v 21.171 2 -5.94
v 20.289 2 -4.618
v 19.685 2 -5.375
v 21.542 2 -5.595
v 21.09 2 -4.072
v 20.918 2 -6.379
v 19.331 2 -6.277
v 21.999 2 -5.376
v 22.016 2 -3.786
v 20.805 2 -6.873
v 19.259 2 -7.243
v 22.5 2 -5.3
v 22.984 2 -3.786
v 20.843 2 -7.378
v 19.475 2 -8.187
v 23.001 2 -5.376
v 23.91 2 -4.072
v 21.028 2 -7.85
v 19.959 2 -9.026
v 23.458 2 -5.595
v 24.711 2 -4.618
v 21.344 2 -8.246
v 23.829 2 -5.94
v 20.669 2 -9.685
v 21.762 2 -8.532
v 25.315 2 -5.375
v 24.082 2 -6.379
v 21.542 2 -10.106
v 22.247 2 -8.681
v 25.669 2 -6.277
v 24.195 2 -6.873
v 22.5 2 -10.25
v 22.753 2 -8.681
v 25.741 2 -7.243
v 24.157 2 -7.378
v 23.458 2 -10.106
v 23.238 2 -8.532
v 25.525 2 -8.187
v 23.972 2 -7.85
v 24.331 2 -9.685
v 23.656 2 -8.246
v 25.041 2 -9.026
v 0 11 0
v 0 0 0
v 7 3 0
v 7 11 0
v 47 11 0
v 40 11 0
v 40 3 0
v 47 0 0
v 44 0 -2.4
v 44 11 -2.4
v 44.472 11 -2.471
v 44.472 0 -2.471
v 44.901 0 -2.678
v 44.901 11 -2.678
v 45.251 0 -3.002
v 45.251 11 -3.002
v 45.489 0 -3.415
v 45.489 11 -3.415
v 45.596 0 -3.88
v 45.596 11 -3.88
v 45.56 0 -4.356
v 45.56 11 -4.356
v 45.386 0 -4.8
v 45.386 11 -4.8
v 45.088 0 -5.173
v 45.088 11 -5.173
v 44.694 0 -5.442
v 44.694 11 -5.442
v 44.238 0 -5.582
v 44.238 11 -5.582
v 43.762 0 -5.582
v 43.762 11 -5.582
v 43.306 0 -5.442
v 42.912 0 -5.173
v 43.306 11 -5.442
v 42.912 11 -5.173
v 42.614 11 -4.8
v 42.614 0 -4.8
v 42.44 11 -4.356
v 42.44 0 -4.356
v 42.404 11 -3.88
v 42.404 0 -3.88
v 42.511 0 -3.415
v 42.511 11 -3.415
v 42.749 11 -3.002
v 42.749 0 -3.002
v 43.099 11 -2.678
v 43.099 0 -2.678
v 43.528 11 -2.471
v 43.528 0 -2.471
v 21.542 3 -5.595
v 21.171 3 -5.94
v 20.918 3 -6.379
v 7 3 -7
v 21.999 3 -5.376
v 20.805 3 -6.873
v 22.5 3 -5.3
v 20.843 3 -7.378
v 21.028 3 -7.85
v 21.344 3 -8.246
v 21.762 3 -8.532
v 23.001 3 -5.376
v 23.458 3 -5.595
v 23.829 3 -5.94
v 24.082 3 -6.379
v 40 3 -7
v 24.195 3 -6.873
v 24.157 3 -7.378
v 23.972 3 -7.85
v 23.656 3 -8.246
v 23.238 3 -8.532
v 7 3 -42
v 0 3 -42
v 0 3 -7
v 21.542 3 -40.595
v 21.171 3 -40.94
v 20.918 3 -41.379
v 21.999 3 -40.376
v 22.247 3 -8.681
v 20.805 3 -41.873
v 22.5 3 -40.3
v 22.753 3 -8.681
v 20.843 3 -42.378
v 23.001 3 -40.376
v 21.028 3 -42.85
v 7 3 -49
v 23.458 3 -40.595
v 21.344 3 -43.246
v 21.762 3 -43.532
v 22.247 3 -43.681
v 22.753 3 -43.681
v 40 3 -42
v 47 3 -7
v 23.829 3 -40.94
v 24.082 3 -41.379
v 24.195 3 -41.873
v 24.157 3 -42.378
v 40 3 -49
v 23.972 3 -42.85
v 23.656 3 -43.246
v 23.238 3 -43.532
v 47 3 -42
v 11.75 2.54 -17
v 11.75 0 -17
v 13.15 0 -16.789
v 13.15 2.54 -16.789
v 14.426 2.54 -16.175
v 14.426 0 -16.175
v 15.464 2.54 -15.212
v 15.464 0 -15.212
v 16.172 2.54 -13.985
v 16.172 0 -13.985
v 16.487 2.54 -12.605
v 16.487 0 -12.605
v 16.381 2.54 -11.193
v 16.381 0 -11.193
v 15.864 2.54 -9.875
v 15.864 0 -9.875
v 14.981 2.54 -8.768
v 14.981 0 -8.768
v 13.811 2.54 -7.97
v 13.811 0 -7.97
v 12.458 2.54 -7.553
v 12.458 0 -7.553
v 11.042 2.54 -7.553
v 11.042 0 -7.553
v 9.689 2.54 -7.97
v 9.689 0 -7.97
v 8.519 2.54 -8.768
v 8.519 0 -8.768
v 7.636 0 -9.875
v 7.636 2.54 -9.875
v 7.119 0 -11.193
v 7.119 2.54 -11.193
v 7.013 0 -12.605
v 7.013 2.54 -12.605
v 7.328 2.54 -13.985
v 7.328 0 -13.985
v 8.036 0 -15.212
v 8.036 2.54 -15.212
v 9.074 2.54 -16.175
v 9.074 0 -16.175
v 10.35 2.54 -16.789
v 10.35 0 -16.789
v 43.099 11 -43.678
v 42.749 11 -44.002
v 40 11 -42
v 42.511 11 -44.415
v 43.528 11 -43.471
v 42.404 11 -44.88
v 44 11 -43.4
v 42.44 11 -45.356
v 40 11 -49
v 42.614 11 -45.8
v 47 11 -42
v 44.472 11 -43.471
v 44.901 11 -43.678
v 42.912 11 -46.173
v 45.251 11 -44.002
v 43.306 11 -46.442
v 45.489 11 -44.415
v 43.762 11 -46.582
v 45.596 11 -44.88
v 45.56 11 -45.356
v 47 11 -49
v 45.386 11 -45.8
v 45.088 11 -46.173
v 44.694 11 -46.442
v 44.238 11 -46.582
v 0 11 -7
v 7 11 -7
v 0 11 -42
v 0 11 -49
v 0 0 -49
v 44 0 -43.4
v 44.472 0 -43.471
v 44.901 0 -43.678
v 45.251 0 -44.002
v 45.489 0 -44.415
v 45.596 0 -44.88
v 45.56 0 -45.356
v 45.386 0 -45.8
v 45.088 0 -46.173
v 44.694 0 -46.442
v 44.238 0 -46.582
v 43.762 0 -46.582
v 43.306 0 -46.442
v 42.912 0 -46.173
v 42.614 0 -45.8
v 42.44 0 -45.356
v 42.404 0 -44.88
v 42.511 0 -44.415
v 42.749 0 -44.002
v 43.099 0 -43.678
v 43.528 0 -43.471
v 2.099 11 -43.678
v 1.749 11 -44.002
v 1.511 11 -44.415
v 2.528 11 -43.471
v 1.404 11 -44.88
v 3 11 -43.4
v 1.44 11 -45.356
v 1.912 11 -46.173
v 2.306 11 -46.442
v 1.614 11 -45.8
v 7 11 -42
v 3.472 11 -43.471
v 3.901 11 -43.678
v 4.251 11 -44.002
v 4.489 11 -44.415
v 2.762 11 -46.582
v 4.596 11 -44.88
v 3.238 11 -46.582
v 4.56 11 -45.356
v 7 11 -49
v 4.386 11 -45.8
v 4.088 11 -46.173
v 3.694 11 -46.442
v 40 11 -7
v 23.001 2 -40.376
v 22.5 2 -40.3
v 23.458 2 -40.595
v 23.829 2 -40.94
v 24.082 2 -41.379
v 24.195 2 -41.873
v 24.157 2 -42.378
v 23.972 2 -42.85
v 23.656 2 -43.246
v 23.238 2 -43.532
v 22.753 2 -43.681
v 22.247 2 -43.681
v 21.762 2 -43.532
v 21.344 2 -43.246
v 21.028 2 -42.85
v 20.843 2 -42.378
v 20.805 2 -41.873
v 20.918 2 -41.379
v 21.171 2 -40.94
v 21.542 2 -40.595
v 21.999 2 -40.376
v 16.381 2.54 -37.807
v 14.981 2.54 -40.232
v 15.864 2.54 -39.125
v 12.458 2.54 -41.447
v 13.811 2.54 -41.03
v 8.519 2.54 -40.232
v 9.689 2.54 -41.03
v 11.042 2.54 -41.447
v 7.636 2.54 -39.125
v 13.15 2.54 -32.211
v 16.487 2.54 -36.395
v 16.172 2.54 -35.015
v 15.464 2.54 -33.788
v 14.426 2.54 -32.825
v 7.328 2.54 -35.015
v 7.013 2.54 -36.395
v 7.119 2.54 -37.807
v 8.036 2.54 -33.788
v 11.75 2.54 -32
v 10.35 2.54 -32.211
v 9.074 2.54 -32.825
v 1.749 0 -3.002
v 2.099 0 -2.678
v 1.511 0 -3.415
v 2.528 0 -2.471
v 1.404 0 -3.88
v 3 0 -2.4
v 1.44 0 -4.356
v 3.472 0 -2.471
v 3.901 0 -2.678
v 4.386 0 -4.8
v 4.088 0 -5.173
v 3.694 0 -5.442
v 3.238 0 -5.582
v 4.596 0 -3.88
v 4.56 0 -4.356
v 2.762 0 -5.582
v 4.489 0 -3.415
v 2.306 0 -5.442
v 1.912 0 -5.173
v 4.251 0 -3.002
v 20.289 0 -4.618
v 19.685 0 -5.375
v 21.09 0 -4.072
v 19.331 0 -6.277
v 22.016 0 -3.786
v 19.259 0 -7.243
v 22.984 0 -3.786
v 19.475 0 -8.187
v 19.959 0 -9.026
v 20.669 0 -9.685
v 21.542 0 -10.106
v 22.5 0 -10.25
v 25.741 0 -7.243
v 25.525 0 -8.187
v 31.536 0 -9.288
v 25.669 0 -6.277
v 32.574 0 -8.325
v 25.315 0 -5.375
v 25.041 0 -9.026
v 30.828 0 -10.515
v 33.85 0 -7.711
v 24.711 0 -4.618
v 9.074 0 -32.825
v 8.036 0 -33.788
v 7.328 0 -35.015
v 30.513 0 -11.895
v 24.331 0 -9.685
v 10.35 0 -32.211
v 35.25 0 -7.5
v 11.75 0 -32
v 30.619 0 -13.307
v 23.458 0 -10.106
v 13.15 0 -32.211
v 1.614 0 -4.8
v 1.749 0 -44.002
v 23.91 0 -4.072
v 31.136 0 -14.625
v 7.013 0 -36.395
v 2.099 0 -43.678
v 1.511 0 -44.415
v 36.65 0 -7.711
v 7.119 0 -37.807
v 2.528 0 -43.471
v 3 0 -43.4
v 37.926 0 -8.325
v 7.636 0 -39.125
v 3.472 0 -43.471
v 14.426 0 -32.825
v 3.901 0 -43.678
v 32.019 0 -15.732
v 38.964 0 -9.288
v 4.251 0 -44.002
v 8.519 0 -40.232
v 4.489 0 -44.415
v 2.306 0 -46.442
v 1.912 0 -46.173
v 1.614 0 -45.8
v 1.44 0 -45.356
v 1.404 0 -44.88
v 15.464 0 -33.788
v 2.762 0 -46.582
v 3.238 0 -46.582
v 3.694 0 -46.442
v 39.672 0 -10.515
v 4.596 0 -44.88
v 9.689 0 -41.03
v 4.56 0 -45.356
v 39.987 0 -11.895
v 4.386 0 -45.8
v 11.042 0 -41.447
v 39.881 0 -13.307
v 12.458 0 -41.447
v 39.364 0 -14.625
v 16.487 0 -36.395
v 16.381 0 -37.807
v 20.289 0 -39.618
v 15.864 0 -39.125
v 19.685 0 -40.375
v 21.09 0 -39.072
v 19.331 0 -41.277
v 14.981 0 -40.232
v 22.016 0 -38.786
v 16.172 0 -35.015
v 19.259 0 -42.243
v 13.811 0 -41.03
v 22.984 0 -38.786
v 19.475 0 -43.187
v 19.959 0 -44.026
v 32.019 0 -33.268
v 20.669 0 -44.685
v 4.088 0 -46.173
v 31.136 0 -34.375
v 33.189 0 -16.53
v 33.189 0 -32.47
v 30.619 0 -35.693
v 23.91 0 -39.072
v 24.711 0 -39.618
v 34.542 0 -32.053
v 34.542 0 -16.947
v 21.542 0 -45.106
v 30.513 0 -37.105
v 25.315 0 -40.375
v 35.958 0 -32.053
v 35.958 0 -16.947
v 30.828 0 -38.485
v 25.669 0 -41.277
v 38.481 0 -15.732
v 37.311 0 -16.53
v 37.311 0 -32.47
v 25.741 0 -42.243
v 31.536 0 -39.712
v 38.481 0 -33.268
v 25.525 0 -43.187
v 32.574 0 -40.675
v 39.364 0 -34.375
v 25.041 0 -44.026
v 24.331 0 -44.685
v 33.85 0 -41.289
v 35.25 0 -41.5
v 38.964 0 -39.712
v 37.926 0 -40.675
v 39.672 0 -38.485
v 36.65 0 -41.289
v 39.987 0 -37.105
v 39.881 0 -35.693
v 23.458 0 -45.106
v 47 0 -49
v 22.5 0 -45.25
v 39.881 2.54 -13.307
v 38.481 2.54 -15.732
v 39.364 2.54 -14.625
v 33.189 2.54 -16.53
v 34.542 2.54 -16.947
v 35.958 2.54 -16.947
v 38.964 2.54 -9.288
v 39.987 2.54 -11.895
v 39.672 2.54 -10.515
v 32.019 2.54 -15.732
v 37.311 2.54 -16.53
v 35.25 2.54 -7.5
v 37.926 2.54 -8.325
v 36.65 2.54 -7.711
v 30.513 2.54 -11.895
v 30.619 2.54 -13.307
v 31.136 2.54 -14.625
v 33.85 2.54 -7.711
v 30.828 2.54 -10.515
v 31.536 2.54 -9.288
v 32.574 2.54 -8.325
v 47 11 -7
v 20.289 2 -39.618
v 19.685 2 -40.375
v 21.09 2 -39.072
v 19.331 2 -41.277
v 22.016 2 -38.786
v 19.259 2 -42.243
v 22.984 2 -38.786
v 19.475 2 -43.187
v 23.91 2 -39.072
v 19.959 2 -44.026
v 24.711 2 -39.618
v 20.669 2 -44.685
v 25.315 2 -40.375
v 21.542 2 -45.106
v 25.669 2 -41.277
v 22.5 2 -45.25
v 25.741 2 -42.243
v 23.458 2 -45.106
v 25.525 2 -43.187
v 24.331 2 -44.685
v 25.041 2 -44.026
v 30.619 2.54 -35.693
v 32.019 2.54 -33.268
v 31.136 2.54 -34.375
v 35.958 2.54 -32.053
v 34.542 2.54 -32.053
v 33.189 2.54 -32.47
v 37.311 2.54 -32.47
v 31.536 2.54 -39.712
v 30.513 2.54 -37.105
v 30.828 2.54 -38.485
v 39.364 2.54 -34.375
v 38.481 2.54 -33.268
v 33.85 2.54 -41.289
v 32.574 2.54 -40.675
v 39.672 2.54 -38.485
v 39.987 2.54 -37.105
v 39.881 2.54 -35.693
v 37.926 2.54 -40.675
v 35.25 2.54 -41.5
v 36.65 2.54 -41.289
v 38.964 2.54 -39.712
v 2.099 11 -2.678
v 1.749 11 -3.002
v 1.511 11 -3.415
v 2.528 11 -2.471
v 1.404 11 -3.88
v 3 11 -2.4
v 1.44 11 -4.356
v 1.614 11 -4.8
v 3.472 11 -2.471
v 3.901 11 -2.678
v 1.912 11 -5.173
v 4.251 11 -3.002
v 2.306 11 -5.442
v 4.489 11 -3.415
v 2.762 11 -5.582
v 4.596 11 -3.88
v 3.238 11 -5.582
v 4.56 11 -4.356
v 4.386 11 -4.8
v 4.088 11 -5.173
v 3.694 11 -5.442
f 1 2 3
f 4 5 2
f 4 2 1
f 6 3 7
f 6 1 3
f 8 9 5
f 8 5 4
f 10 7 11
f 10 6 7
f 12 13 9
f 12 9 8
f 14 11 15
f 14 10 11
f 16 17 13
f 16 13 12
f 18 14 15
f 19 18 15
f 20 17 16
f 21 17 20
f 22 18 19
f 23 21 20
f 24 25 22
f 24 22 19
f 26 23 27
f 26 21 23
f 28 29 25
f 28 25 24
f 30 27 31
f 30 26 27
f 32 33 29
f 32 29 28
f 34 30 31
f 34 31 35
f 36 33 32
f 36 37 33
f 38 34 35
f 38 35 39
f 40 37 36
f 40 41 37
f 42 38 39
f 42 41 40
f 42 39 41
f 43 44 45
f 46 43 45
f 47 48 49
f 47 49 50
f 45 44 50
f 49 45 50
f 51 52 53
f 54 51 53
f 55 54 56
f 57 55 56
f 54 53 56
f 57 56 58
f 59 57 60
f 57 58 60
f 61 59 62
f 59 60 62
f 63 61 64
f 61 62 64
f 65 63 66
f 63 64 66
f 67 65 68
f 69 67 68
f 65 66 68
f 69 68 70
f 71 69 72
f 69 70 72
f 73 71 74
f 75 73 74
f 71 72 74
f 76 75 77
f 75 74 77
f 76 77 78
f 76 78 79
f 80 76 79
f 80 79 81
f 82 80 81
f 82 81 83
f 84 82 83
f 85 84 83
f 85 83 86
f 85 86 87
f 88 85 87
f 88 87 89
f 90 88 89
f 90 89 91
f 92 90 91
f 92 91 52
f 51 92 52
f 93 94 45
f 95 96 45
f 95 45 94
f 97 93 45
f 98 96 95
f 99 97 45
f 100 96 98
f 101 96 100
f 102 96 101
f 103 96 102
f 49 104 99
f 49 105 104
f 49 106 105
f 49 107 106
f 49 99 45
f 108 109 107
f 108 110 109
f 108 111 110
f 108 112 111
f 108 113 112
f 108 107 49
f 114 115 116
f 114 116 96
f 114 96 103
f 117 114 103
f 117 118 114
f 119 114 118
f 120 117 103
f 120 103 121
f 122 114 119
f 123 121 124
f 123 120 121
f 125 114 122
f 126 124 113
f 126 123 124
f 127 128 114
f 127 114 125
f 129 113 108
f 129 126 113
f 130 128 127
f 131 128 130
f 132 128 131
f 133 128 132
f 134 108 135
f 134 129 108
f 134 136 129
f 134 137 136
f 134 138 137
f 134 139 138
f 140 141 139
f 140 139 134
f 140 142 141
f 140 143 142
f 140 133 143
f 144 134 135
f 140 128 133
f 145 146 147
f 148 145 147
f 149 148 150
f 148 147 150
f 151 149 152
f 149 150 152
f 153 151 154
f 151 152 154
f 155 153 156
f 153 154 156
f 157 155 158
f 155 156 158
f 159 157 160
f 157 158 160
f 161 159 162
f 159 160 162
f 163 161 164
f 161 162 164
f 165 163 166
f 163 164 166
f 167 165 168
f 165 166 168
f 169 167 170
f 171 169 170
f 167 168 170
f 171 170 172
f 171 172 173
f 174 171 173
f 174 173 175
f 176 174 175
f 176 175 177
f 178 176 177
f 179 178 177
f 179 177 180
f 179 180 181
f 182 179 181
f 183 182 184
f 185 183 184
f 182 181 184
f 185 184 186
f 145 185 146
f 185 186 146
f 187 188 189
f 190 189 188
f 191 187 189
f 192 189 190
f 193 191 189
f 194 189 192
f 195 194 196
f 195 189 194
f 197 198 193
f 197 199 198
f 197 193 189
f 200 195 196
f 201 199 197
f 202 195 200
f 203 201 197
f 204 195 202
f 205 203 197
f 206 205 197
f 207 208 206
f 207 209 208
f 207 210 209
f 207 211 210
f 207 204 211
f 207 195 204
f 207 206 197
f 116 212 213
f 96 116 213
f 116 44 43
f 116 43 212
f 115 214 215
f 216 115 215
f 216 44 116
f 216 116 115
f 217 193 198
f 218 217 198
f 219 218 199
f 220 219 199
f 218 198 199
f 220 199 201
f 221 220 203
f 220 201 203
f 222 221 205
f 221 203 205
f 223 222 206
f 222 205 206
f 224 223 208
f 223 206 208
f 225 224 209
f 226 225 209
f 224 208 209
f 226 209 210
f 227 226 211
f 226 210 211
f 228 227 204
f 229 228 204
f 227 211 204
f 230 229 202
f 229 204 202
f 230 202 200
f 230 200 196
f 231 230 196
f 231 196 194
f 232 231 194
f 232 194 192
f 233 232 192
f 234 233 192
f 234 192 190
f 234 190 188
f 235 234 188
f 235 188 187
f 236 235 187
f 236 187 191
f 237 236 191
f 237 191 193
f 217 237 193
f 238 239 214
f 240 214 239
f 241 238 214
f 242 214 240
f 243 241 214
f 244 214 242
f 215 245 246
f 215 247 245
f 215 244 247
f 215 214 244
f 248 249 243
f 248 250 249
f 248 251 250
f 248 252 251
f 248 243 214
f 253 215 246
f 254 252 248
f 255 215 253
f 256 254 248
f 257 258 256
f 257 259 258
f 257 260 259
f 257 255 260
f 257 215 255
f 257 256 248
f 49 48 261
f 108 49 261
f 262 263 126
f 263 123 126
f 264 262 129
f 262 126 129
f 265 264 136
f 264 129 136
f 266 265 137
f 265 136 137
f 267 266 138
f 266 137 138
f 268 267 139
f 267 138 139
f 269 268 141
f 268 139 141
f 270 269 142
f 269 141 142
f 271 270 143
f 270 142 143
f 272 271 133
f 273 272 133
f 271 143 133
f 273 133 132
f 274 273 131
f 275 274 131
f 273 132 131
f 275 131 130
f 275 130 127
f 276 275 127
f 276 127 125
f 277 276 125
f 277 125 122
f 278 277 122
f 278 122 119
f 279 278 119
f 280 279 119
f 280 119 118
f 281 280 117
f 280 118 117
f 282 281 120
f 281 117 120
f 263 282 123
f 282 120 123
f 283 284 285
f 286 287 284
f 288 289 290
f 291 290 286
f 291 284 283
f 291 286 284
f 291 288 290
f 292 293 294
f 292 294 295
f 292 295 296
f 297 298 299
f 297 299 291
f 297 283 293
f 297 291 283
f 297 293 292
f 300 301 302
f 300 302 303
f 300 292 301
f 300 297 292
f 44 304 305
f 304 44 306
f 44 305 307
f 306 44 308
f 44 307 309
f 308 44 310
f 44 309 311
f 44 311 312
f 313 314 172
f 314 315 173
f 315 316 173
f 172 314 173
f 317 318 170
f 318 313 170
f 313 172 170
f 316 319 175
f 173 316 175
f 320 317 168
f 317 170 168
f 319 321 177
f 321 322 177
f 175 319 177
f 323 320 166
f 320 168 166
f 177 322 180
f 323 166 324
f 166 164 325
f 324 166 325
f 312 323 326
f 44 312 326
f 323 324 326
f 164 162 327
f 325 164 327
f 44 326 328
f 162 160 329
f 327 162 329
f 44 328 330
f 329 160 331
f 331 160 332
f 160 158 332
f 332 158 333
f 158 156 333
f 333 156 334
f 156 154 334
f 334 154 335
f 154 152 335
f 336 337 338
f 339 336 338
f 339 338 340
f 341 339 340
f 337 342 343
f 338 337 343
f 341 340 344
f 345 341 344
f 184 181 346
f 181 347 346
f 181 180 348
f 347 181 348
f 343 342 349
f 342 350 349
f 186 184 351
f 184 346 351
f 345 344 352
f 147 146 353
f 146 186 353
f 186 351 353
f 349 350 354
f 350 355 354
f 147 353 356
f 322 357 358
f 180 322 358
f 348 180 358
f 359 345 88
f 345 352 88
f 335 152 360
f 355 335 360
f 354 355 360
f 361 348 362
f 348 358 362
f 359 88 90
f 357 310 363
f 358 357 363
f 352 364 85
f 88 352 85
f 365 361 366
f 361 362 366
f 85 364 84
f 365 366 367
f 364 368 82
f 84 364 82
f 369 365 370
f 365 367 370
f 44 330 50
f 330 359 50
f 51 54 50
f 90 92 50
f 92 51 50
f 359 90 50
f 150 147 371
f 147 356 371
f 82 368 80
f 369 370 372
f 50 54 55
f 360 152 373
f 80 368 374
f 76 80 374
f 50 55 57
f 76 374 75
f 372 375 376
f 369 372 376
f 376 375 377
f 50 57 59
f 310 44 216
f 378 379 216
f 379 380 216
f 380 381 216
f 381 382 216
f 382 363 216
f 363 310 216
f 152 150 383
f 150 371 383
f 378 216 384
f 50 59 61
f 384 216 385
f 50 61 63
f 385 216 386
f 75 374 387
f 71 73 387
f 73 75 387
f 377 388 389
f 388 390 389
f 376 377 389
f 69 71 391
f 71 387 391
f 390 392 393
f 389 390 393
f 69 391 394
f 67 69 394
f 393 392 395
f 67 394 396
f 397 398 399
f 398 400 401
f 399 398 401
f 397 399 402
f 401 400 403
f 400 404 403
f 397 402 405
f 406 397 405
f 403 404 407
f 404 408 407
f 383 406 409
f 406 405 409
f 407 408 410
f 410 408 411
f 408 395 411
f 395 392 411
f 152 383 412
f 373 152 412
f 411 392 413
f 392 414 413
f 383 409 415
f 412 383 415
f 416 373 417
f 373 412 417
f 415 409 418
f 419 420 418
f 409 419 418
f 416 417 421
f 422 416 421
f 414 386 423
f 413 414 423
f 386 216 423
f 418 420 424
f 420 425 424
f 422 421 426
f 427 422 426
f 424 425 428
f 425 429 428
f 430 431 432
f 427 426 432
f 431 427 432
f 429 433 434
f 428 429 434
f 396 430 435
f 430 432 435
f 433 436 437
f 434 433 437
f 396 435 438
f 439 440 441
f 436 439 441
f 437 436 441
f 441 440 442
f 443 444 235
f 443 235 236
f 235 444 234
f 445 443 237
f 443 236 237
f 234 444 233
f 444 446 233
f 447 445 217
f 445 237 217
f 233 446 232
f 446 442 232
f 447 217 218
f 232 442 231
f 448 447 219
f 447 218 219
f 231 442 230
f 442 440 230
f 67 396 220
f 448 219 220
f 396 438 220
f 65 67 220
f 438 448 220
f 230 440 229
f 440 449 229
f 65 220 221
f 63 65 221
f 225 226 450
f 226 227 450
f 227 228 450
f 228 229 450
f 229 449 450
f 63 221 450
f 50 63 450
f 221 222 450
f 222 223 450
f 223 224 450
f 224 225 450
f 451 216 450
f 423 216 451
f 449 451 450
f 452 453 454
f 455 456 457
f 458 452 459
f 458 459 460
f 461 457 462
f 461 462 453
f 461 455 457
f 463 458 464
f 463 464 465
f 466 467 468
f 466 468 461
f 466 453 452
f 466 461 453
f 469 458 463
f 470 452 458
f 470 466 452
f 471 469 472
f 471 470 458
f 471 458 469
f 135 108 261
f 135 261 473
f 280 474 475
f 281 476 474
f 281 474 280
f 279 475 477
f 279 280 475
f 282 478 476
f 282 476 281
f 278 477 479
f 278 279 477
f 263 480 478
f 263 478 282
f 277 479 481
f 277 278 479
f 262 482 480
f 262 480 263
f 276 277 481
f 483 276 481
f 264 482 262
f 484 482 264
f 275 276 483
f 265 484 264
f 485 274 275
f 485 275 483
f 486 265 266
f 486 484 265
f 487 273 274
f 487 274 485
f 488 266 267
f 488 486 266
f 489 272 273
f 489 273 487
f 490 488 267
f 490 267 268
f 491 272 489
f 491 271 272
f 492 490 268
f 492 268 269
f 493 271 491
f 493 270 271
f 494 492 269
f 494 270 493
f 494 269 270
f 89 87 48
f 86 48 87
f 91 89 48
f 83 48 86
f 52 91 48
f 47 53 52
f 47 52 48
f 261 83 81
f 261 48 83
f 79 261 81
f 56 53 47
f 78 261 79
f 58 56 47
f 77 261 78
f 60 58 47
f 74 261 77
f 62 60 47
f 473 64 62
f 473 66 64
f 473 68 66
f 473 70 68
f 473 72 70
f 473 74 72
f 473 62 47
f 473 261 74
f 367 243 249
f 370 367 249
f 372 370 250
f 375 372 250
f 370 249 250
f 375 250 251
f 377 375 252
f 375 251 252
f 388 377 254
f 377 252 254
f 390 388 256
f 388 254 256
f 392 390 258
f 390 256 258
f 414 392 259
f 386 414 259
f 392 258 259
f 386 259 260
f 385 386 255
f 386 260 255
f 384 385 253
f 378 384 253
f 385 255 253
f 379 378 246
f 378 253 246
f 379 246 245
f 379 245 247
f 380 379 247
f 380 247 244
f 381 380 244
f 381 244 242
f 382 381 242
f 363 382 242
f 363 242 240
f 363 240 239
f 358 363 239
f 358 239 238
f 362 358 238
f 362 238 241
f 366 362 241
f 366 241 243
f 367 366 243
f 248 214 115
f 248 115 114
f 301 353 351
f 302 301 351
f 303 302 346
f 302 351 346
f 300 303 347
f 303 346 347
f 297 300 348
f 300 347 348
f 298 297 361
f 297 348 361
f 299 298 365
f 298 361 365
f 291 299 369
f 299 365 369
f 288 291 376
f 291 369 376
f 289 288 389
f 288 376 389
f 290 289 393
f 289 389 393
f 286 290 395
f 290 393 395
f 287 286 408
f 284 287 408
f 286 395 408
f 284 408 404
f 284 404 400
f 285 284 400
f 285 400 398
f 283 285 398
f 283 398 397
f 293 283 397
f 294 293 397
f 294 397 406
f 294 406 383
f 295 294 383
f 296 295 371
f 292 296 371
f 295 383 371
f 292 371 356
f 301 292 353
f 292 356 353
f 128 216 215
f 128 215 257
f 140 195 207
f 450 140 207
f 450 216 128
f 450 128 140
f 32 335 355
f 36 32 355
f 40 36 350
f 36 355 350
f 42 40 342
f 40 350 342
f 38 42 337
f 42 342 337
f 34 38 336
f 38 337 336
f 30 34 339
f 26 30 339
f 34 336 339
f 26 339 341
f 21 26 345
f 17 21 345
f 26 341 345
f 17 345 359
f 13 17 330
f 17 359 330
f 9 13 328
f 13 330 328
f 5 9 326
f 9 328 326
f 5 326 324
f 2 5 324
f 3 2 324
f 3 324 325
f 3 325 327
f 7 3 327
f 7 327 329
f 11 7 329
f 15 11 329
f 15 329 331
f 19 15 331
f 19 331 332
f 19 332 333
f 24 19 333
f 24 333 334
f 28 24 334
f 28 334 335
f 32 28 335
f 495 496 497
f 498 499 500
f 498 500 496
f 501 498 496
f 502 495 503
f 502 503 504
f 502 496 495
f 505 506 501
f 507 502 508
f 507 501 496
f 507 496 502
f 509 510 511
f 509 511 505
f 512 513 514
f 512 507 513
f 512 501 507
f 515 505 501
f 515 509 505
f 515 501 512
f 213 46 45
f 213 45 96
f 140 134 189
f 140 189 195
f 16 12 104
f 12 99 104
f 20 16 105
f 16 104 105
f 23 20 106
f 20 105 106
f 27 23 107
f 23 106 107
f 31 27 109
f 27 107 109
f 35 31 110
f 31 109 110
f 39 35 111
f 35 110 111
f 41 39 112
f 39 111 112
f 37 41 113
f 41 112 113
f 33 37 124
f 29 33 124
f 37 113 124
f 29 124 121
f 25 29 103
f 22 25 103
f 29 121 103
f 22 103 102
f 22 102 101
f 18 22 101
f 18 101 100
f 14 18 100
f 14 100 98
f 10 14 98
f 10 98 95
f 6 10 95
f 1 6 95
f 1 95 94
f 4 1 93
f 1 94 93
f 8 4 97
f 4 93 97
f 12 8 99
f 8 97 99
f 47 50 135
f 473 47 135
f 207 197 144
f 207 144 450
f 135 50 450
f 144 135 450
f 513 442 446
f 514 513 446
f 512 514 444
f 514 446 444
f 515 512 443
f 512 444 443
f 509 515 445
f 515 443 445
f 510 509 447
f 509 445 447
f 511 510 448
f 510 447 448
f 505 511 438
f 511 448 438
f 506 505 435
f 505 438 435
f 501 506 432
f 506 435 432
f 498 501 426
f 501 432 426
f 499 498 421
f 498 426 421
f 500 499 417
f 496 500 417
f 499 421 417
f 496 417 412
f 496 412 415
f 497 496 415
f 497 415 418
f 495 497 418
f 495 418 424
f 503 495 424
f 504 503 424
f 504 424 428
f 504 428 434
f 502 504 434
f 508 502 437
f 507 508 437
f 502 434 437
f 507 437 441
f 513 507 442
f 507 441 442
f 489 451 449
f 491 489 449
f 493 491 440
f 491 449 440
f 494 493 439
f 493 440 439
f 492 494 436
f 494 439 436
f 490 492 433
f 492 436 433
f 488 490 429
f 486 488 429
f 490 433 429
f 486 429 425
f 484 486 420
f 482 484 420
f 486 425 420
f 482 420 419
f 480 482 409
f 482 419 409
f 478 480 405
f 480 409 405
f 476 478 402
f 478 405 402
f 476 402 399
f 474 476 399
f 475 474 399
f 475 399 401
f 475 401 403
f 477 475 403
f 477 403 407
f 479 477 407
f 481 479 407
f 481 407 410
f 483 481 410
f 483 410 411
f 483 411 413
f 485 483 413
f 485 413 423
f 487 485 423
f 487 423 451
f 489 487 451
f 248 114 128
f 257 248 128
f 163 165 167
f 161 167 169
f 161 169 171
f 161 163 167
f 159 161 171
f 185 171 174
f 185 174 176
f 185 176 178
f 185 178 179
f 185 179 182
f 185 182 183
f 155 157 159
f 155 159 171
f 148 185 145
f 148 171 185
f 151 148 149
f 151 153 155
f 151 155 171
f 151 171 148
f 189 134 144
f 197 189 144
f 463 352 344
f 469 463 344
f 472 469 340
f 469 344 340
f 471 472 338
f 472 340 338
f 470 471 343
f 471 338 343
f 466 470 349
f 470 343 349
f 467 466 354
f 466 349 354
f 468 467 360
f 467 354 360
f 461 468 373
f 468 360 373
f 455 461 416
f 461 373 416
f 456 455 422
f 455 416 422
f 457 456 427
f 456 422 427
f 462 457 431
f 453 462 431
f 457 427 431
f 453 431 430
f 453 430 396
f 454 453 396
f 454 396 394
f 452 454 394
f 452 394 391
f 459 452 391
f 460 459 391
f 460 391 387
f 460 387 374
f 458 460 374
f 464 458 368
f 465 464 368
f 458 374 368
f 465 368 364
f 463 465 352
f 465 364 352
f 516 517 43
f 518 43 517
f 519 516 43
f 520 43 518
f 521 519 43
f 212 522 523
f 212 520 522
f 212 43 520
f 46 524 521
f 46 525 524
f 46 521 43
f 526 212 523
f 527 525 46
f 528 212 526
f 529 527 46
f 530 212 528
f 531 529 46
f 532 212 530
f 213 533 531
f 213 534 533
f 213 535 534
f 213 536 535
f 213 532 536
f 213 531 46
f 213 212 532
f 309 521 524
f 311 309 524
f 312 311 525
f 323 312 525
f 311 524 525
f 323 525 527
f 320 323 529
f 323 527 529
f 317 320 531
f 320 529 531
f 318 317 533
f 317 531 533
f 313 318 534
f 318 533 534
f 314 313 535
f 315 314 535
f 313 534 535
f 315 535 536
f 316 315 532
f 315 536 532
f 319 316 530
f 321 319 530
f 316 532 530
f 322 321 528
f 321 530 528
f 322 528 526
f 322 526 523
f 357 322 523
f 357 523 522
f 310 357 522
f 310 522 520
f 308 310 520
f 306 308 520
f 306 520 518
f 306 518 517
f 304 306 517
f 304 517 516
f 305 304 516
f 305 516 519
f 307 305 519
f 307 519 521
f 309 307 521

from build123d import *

# Parameters (mm, degrees)
CROQUIS1_W                                           = 47
CROQUIS1_H                                           = 49
SALIENTE_EXTRUIR1_DEPTH                              = 3
CROQUIS14_W                                          = 7
CROQUIS14_H                                          = 7
SALIENTE_EXTRUIR4_DEPTH                              = 8
TALADRO_DE_MARGEN_PARA_M35_D                         = 3.2
REFRENTADO_PARA_TORNILLO_CON_CABEZA_PLAN_D           = 3.4
REFRENTADO_PARA_TORNILLO_CON_CABEZA_PLAN_CBORE_D     = 6.5
REFRENTADO_PARA_TORNILLO_CON_CABEZA_PLAN_CBORE_DEPTH = 2
CROQUIS25_R                                          = 4.75
CORTAR_EXTRUIR4_DEPTH                                = 2.54


with BuildPart() as part:
    # Croquis1 → Saliente-Extruir1 (new body)
    with BuildSketch(Plane(origin=(0, 0, 0), x_dir=(1, 0, 0), z_dir=(0, 1, 0))):
        with Locations((23.5, 24.5)):
            Rectangle(CROQUIS1_W, CROQUIS1_H)
    extrude(amount=SALIENTE_EXTRUIR1_DEPTH)

    # Croquis14 → Saliente-Extruir4 (add)
    with BuildSketch(Plane(origin=(0, 3, 0), x_dir=(1, 0, 0), z_dir=(0, 1, 0))):
        with Locations((3.5, 45.5)):
            Rectangle(CROQUIS14_W, CROQUIS14_H)
        with Locations((43.5, 45.5)):
            Rectangle(CROQUIS14_W, CROQUIS14_H)
        with Locations((43.5, 3.5)):
            Rectangle(CROQUIS14_W, CROQUIS14_H)
        with Locations((3.5, 3.5)):
            Rectangle(CROQUIS14_W, CROQUIS14_H)
    extrude(amount=SALIENTE_EXTRUIR4_DEPTH)

    # Taladro de margen para M35 (through all)
    with Locations(Plane(origin=(3, 0, -4), x_dir=(0, 0, -1), z_dir=(0, -1, 0))):
        with Locations((0, 0), (0, 41), (41, 41), (41, 0)):
            Hole(TALADRO_DE_MARGEN_PARA_M35_D / 2)

    # Refrentado para tornillo con cabeza plana de M31 (through all)
    with Locations(Plane(origin=(22.5, 0, -7), x_dir=(0, 0, -1), z_dir=(0, -1, 0))):
        with Locations((0, 0), (35, 0)):
            CounterBoreHole(REFRENTADO_PARA_TORNILLO_CON_CABEZA_PLAN_D / 2, REFRENTADO_PARA_TORNILLO_CON_CABEZA_PLAN_CBORE_D / 2, REFRENTADO_PARA_TORNILLO_CON_CABEZA_PLAN_CBORE_DEPTH)

    # Croquis25 → Cortar-Extruir4 (cut)
    with BuildSketch(Plane.XZ):
        with Locations(Location((11.75, -12.25, 0), (0, 0, 270))):
            Circle(CROQUIS25_R)
        with Locations(Location((35.25, -12.25, 0), (0, 0, 90))):
            Circle(CROQUIS25_R)
        with Locations(Location((35.25, -36.75, 0), (0, 0, 270))):
            Circle(CROQUIS25_R)
        with Locations(Location((11.75, -36.75, 0), (0, 0, 90))):
            Circle(CROQUIS25_R)
    extrude(amount=-CORTAR_EXTRUIR4_DEPTH, mode=Mode.SUBTRACT)


solid = part.part
